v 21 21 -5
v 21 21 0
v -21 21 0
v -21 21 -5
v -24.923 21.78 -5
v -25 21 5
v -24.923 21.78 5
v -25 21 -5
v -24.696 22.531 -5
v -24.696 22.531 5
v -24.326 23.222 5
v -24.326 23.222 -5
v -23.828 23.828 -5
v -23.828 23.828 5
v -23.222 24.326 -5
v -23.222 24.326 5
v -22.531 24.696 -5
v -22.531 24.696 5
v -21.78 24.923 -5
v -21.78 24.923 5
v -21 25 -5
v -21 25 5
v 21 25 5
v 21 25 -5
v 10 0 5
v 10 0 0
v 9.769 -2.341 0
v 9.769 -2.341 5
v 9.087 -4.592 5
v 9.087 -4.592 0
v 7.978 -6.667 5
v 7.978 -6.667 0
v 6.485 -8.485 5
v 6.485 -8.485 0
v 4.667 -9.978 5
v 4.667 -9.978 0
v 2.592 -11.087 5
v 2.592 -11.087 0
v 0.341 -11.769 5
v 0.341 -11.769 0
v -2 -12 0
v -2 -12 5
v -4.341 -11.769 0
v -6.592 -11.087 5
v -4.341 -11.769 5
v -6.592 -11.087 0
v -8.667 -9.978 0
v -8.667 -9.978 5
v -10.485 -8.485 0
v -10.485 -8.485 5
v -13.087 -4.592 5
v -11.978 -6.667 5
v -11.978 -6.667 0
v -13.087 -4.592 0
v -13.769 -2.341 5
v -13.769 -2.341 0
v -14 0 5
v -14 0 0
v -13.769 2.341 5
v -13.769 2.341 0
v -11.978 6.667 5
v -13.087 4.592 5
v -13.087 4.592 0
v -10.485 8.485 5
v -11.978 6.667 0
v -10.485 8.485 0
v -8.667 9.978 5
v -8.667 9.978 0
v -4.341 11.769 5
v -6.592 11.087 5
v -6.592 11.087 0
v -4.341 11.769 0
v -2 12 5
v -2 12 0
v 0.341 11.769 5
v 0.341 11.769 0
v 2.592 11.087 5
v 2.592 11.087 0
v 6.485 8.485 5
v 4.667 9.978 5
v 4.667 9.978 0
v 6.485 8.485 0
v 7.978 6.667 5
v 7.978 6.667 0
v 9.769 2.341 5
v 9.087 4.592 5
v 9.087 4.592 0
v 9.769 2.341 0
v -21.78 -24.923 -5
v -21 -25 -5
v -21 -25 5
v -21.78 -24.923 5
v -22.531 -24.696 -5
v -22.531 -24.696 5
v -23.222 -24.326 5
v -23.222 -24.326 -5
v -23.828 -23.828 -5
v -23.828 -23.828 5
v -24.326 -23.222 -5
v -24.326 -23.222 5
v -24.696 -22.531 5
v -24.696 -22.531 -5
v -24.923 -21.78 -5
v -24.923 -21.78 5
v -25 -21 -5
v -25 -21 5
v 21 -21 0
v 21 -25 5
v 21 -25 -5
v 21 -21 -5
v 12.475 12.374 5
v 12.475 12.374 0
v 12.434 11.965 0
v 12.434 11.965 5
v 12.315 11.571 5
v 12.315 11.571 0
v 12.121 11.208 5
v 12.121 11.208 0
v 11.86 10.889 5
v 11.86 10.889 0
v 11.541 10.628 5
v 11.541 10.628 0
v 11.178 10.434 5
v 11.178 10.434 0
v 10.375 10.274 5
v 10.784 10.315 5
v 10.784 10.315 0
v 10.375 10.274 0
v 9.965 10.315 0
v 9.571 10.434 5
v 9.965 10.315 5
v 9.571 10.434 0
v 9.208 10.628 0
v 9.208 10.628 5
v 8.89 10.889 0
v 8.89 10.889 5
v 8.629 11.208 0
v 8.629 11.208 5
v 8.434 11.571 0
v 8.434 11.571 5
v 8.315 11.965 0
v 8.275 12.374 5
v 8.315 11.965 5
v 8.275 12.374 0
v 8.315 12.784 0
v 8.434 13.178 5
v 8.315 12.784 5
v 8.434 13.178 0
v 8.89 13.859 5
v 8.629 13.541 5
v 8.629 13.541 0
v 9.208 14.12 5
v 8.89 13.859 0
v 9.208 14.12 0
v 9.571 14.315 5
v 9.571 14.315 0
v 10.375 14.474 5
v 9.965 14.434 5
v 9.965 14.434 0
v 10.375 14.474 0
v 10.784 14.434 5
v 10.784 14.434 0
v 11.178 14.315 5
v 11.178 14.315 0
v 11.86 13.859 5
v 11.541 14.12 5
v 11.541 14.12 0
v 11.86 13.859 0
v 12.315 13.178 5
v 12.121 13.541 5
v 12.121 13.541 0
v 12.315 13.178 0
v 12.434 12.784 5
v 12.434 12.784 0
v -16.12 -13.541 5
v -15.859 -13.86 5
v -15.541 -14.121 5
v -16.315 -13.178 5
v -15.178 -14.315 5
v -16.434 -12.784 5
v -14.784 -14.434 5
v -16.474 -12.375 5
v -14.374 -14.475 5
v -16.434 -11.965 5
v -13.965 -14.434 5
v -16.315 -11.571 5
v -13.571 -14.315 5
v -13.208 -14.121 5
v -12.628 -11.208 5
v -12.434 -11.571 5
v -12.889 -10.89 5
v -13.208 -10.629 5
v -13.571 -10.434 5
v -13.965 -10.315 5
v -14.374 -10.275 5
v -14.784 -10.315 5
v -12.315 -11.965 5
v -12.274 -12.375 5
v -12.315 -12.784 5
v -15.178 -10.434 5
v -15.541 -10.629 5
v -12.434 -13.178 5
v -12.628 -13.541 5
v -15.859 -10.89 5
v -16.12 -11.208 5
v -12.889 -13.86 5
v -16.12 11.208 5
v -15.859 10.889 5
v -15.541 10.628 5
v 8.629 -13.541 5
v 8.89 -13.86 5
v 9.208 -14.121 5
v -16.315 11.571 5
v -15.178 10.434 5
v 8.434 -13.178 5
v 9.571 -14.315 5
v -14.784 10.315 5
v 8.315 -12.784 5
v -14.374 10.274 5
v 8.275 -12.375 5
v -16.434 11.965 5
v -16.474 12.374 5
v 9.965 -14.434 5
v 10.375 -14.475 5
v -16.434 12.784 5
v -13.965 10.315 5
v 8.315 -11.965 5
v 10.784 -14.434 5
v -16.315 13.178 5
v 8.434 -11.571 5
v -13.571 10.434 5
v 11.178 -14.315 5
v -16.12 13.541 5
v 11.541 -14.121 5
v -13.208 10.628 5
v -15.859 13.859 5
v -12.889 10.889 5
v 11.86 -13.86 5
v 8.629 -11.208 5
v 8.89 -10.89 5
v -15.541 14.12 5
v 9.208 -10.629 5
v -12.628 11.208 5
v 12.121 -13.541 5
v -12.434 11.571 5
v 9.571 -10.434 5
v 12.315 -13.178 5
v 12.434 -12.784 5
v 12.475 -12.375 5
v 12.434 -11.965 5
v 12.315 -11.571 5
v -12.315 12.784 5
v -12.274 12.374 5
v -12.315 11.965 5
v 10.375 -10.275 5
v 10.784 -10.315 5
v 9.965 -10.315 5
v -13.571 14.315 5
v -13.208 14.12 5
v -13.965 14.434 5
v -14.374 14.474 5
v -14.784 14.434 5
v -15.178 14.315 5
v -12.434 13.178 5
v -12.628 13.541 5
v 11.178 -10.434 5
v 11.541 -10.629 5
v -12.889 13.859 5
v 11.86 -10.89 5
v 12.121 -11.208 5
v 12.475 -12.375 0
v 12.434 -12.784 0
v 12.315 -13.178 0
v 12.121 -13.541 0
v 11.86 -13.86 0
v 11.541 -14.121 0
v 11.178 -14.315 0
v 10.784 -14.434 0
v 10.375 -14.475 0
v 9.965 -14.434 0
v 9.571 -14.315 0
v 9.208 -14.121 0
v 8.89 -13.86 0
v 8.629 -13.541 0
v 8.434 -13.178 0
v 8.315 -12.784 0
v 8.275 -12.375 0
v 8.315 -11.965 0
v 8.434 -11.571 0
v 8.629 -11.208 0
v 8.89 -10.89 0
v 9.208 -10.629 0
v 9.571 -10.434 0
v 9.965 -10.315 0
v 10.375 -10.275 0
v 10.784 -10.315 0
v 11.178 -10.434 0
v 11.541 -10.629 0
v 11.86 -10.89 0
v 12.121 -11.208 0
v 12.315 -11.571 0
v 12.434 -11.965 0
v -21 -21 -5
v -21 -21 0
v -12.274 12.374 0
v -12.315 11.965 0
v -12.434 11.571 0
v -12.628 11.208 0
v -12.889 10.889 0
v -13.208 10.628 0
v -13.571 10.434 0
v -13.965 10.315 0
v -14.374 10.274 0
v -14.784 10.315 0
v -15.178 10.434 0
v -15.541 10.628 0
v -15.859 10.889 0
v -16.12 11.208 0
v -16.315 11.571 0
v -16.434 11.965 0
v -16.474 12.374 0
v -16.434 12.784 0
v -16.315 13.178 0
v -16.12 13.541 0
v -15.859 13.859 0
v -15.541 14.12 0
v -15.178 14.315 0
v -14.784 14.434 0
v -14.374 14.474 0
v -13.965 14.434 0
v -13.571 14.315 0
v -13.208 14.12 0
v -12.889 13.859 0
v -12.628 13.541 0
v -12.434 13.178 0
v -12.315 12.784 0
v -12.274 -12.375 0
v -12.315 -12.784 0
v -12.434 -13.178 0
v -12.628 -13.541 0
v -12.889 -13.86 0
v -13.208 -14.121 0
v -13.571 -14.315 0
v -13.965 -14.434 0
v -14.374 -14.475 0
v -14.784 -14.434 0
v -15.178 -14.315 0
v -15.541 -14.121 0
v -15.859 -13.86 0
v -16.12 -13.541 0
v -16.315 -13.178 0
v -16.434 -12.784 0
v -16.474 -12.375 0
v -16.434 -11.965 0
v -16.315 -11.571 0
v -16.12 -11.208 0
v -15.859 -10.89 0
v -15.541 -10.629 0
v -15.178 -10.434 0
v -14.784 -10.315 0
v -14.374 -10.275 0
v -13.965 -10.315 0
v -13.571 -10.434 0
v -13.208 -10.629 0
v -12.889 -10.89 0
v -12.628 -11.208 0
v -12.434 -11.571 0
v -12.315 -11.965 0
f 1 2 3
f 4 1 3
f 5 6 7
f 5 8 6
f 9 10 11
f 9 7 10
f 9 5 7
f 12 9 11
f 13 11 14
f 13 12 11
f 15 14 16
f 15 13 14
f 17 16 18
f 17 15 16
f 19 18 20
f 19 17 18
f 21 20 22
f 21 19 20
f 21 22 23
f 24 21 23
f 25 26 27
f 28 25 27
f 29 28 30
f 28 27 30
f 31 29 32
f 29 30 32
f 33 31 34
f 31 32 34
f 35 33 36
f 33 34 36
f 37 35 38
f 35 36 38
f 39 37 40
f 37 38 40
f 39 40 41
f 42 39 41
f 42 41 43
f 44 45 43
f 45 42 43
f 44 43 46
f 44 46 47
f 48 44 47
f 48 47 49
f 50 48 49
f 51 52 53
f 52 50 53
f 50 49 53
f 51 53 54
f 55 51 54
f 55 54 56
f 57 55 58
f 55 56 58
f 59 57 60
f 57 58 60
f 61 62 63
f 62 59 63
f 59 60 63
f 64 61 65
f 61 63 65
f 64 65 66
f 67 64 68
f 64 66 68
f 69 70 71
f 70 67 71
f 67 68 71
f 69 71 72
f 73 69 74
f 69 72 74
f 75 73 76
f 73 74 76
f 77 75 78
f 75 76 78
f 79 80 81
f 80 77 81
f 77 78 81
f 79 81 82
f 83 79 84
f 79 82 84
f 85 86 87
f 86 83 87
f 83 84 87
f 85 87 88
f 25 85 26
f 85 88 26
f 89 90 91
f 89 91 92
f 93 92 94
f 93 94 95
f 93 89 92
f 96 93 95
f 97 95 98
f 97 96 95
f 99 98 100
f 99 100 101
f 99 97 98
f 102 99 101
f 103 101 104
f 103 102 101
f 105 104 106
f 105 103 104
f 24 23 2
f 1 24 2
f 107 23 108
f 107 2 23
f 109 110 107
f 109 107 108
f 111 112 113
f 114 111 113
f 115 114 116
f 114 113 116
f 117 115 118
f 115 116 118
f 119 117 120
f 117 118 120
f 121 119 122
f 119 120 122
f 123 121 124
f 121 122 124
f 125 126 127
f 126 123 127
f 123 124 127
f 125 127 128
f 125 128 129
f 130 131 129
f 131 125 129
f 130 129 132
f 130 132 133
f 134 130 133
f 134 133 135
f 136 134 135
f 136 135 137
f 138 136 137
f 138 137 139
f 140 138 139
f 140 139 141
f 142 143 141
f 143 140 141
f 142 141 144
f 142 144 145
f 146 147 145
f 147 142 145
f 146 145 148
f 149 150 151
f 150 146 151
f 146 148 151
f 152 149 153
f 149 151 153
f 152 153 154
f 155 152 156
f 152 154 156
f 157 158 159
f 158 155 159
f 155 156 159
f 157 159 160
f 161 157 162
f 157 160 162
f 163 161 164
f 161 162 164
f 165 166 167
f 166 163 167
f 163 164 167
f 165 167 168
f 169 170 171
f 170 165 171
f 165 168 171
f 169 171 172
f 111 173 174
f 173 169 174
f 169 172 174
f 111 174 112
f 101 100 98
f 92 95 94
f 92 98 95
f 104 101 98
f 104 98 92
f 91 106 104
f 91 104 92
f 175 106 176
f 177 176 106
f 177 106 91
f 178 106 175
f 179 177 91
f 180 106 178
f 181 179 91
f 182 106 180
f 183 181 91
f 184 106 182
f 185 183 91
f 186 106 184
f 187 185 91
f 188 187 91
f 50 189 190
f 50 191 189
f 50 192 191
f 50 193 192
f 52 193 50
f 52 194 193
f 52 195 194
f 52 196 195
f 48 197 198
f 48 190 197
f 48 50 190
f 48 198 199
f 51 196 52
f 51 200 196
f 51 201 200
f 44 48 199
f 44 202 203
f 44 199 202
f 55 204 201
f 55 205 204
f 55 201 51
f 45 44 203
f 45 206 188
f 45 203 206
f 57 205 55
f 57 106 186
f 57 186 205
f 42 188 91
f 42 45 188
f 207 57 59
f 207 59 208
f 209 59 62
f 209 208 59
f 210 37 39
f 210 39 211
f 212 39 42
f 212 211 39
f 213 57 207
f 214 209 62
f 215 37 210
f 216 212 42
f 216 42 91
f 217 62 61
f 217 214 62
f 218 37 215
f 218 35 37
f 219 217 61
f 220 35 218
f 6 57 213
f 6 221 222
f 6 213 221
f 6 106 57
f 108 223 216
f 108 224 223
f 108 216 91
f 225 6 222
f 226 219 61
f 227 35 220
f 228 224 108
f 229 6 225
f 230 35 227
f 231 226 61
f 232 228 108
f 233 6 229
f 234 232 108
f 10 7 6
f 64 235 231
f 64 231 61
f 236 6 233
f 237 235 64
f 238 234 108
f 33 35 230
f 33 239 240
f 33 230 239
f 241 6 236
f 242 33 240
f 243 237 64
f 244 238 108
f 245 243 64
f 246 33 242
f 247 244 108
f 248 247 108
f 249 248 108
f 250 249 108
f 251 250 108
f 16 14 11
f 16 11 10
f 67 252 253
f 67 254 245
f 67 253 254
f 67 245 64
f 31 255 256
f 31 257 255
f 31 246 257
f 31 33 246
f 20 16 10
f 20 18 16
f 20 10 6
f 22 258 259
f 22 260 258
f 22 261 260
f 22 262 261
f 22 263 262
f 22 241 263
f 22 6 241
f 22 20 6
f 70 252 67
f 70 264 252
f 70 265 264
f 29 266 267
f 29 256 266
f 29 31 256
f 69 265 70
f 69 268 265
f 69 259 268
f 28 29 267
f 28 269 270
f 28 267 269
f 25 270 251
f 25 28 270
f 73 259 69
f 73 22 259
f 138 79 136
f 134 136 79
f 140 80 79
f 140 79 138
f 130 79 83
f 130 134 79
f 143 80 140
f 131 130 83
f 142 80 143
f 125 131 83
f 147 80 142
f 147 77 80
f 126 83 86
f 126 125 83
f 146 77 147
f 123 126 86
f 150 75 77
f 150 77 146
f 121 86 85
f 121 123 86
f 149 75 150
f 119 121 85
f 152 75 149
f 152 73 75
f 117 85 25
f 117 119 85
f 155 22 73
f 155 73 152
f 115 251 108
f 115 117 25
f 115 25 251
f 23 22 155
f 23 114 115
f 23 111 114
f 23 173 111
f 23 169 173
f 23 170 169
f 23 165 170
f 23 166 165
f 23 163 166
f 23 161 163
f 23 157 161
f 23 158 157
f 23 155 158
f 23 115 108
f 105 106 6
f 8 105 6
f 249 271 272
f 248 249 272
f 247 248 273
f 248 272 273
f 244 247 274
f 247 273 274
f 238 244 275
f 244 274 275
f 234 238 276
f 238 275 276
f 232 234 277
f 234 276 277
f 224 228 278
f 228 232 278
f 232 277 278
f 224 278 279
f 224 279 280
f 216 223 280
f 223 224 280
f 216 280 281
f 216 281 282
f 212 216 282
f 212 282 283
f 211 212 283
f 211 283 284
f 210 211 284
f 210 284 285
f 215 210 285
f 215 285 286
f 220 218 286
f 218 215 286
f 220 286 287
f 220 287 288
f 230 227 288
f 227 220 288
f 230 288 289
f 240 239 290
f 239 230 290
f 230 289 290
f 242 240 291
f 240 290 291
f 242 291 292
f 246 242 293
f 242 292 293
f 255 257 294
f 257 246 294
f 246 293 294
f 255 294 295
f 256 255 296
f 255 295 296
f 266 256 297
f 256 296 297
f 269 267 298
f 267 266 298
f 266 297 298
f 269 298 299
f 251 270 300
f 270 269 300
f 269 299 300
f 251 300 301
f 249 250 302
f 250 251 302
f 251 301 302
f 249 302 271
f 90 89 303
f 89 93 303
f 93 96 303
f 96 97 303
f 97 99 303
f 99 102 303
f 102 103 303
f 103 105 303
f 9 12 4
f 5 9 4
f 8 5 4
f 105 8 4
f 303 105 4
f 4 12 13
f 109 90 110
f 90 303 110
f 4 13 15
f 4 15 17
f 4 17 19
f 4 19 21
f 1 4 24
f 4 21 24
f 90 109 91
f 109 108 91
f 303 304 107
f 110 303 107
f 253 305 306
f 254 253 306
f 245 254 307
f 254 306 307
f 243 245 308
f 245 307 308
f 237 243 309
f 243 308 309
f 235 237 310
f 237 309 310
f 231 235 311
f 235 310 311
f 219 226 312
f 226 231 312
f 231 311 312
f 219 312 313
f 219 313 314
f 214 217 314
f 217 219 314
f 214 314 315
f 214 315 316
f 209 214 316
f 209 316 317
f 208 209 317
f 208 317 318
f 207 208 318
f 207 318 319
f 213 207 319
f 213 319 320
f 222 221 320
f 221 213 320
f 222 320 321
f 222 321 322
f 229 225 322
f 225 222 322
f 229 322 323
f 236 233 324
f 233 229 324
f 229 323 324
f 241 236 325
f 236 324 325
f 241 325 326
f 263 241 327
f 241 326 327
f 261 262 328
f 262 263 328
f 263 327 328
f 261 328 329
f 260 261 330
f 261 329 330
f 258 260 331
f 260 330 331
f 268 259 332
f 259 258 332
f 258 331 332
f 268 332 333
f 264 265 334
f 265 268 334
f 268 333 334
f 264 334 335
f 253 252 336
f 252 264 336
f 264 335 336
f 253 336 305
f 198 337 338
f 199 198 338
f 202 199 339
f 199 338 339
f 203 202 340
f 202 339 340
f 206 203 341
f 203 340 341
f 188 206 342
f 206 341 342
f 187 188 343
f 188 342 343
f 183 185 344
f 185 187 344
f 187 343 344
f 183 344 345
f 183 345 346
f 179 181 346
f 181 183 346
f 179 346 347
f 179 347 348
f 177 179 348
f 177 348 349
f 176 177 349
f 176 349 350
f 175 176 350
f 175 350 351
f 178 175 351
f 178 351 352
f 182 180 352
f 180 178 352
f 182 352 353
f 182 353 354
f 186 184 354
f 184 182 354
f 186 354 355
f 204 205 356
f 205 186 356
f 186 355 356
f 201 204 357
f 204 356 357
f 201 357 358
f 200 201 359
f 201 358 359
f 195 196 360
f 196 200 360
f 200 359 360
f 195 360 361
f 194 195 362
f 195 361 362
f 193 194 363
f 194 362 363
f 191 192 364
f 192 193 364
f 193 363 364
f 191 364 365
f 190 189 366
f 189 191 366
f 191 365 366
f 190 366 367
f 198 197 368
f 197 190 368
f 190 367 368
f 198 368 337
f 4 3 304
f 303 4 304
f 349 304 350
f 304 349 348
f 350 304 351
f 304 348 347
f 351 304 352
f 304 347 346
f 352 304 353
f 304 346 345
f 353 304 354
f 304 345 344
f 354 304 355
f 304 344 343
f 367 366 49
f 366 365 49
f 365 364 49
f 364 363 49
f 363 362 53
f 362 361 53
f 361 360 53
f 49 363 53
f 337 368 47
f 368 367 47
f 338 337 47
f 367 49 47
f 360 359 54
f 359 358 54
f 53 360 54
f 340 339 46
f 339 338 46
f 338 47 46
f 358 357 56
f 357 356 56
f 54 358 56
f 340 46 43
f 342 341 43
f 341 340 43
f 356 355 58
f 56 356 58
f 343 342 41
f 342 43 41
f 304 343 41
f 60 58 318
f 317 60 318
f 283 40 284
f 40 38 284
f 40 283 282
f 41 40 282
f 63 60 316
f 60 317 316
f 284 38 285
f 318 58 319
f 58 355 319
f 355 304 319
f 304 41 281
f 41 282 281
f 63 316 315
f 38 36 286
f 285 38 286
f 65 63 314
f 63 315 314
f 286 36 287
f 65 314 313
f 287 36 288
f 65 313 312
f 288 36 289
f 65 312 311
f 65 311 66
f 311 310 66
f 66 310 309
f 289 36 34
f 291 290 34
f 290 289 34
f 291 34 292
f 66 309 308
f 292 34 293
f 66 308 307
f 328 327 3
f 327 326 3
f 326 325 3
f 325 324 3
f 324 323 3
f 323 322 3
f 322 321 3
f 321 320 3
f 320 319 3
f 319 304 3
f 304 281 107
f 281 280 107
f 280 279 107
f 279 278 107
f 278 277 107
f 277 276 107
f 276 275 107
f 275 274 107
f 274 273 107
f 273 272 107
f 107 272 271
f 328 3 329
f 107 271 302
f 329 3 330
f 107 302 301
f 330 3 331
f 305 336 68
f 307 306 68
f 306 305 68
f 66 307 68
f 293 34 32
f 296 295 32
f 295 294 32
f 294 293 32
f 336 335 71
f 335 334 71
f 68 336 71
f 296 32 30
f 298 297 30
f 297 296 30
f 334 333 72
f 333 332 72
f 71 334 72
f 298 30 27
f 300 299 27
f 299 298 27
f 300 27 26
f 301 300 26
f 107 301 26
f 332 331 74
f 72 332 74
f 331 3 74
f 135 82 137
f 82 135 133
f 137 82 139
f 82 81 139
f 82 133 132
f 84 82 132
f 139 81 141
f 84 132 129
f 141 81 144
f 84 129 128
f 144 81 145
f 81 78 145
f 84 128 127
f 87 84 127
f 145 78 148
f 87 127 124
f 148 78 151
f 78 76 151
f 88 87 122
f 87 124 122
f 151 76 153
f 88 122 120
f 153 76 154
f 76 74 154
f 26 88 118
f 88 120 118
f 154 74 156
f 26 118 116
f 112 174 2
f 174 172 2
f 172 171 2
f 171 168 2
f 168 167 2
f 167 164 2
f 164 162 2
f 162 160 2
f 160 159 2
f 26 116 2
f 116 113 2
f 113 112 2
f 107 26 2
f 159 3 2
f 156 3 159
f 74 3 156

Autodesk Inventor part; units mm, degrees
ref_plane "YZ Plane" through (0, 0, 0) normal (1, 0, 0) x (0, 1, 0)
ref_plane "XZ Plane" through (0, 0, 0) normal (0, 1, 0) x (-1, 0, 0)
ref_plane "XY Plane" through (0, 0, 0) normal (0, 0, 1) x (1, 0, 0)
sketch "Sketch1" plane through (0, 0, 0) normal (0, 0, 1) x (1, 0, 0)
  line L0 (-21, 20) -> (-21, -20) construction
  line L1 (14.2964, 21) -> (-14.2964, 21) construction
  line L2 (21, -20) -> (21, 20) construction
  line L3 (-14.2964, -21) -> (14.2964, -21) construction
  circle A0 centre (-14.3744, 12.3744) radius 1.621 construction
  circle A1 centre (10.3746, 12.3744) radius 1.621 construction
  circle A2 centre (10.3746, -12.3746) radius 1.621 construction
  circle A3 centre (-14.3744, -12.3746) radius 1.621 construction
  line L4 (-21, 21) -> (21, 21)
  line L5 (21, 21) -> (21, -21)
  line L6 (21, -21) -> (-21, -21)
  line L7 (-21, -21) -> (-21, 21)
  circle A4 centre (-14.3744, 12.3744) radius 2.1
  circle A5 centre (10.3746, 12.3744) radius 2.1
  circle A6 centre (10.3746, -12.3746) radius 2.1
  circle A7 centre (-14.3744, -12.3746) radius 2.1
  circle A8 centre (-2, 0) radius 11 construction
  circle A9 centre (-2, 0) radius 12
  point P0 (0, 0)
  dimension "d0" = 4.2
  dimension "d1" = 1
extrude "Extrusion1" add sketch "Sketch1" along normal blind 5
sketch "Sketch2" plane through (0, 0, 5) normal (0, 0, 1) x (1, 0, 0)
  line L0 (-21, -21) -> (21, -21) projected
  line L1 (21, 21) -> (-21, 21) projected
  line L2 (-21, 21) -> (-21, -21) projected
  line L3 (21, -21) -> (21, -25)
  line L4 (21, -25) -> (-25, -25)
  line L5 (-25, -25) -> (-25, 25)
  line L6 (-25, 25) -> (21, 25)
  line L7 (21, 25) -> (21, 21)
  point P0 (0, 0)
  dimension "d4" = 4
  dimension "d5" = 4
  dimension "d6" = 4
extrude "Extrusion2" add sketch "Sketch2" against normal blind 10
fillet "Fillet1" radius 4 2 edges at (-25, -25, 0) (-25, 25, 0)
properties part number "ShoulderEncoderDrillGuide"
